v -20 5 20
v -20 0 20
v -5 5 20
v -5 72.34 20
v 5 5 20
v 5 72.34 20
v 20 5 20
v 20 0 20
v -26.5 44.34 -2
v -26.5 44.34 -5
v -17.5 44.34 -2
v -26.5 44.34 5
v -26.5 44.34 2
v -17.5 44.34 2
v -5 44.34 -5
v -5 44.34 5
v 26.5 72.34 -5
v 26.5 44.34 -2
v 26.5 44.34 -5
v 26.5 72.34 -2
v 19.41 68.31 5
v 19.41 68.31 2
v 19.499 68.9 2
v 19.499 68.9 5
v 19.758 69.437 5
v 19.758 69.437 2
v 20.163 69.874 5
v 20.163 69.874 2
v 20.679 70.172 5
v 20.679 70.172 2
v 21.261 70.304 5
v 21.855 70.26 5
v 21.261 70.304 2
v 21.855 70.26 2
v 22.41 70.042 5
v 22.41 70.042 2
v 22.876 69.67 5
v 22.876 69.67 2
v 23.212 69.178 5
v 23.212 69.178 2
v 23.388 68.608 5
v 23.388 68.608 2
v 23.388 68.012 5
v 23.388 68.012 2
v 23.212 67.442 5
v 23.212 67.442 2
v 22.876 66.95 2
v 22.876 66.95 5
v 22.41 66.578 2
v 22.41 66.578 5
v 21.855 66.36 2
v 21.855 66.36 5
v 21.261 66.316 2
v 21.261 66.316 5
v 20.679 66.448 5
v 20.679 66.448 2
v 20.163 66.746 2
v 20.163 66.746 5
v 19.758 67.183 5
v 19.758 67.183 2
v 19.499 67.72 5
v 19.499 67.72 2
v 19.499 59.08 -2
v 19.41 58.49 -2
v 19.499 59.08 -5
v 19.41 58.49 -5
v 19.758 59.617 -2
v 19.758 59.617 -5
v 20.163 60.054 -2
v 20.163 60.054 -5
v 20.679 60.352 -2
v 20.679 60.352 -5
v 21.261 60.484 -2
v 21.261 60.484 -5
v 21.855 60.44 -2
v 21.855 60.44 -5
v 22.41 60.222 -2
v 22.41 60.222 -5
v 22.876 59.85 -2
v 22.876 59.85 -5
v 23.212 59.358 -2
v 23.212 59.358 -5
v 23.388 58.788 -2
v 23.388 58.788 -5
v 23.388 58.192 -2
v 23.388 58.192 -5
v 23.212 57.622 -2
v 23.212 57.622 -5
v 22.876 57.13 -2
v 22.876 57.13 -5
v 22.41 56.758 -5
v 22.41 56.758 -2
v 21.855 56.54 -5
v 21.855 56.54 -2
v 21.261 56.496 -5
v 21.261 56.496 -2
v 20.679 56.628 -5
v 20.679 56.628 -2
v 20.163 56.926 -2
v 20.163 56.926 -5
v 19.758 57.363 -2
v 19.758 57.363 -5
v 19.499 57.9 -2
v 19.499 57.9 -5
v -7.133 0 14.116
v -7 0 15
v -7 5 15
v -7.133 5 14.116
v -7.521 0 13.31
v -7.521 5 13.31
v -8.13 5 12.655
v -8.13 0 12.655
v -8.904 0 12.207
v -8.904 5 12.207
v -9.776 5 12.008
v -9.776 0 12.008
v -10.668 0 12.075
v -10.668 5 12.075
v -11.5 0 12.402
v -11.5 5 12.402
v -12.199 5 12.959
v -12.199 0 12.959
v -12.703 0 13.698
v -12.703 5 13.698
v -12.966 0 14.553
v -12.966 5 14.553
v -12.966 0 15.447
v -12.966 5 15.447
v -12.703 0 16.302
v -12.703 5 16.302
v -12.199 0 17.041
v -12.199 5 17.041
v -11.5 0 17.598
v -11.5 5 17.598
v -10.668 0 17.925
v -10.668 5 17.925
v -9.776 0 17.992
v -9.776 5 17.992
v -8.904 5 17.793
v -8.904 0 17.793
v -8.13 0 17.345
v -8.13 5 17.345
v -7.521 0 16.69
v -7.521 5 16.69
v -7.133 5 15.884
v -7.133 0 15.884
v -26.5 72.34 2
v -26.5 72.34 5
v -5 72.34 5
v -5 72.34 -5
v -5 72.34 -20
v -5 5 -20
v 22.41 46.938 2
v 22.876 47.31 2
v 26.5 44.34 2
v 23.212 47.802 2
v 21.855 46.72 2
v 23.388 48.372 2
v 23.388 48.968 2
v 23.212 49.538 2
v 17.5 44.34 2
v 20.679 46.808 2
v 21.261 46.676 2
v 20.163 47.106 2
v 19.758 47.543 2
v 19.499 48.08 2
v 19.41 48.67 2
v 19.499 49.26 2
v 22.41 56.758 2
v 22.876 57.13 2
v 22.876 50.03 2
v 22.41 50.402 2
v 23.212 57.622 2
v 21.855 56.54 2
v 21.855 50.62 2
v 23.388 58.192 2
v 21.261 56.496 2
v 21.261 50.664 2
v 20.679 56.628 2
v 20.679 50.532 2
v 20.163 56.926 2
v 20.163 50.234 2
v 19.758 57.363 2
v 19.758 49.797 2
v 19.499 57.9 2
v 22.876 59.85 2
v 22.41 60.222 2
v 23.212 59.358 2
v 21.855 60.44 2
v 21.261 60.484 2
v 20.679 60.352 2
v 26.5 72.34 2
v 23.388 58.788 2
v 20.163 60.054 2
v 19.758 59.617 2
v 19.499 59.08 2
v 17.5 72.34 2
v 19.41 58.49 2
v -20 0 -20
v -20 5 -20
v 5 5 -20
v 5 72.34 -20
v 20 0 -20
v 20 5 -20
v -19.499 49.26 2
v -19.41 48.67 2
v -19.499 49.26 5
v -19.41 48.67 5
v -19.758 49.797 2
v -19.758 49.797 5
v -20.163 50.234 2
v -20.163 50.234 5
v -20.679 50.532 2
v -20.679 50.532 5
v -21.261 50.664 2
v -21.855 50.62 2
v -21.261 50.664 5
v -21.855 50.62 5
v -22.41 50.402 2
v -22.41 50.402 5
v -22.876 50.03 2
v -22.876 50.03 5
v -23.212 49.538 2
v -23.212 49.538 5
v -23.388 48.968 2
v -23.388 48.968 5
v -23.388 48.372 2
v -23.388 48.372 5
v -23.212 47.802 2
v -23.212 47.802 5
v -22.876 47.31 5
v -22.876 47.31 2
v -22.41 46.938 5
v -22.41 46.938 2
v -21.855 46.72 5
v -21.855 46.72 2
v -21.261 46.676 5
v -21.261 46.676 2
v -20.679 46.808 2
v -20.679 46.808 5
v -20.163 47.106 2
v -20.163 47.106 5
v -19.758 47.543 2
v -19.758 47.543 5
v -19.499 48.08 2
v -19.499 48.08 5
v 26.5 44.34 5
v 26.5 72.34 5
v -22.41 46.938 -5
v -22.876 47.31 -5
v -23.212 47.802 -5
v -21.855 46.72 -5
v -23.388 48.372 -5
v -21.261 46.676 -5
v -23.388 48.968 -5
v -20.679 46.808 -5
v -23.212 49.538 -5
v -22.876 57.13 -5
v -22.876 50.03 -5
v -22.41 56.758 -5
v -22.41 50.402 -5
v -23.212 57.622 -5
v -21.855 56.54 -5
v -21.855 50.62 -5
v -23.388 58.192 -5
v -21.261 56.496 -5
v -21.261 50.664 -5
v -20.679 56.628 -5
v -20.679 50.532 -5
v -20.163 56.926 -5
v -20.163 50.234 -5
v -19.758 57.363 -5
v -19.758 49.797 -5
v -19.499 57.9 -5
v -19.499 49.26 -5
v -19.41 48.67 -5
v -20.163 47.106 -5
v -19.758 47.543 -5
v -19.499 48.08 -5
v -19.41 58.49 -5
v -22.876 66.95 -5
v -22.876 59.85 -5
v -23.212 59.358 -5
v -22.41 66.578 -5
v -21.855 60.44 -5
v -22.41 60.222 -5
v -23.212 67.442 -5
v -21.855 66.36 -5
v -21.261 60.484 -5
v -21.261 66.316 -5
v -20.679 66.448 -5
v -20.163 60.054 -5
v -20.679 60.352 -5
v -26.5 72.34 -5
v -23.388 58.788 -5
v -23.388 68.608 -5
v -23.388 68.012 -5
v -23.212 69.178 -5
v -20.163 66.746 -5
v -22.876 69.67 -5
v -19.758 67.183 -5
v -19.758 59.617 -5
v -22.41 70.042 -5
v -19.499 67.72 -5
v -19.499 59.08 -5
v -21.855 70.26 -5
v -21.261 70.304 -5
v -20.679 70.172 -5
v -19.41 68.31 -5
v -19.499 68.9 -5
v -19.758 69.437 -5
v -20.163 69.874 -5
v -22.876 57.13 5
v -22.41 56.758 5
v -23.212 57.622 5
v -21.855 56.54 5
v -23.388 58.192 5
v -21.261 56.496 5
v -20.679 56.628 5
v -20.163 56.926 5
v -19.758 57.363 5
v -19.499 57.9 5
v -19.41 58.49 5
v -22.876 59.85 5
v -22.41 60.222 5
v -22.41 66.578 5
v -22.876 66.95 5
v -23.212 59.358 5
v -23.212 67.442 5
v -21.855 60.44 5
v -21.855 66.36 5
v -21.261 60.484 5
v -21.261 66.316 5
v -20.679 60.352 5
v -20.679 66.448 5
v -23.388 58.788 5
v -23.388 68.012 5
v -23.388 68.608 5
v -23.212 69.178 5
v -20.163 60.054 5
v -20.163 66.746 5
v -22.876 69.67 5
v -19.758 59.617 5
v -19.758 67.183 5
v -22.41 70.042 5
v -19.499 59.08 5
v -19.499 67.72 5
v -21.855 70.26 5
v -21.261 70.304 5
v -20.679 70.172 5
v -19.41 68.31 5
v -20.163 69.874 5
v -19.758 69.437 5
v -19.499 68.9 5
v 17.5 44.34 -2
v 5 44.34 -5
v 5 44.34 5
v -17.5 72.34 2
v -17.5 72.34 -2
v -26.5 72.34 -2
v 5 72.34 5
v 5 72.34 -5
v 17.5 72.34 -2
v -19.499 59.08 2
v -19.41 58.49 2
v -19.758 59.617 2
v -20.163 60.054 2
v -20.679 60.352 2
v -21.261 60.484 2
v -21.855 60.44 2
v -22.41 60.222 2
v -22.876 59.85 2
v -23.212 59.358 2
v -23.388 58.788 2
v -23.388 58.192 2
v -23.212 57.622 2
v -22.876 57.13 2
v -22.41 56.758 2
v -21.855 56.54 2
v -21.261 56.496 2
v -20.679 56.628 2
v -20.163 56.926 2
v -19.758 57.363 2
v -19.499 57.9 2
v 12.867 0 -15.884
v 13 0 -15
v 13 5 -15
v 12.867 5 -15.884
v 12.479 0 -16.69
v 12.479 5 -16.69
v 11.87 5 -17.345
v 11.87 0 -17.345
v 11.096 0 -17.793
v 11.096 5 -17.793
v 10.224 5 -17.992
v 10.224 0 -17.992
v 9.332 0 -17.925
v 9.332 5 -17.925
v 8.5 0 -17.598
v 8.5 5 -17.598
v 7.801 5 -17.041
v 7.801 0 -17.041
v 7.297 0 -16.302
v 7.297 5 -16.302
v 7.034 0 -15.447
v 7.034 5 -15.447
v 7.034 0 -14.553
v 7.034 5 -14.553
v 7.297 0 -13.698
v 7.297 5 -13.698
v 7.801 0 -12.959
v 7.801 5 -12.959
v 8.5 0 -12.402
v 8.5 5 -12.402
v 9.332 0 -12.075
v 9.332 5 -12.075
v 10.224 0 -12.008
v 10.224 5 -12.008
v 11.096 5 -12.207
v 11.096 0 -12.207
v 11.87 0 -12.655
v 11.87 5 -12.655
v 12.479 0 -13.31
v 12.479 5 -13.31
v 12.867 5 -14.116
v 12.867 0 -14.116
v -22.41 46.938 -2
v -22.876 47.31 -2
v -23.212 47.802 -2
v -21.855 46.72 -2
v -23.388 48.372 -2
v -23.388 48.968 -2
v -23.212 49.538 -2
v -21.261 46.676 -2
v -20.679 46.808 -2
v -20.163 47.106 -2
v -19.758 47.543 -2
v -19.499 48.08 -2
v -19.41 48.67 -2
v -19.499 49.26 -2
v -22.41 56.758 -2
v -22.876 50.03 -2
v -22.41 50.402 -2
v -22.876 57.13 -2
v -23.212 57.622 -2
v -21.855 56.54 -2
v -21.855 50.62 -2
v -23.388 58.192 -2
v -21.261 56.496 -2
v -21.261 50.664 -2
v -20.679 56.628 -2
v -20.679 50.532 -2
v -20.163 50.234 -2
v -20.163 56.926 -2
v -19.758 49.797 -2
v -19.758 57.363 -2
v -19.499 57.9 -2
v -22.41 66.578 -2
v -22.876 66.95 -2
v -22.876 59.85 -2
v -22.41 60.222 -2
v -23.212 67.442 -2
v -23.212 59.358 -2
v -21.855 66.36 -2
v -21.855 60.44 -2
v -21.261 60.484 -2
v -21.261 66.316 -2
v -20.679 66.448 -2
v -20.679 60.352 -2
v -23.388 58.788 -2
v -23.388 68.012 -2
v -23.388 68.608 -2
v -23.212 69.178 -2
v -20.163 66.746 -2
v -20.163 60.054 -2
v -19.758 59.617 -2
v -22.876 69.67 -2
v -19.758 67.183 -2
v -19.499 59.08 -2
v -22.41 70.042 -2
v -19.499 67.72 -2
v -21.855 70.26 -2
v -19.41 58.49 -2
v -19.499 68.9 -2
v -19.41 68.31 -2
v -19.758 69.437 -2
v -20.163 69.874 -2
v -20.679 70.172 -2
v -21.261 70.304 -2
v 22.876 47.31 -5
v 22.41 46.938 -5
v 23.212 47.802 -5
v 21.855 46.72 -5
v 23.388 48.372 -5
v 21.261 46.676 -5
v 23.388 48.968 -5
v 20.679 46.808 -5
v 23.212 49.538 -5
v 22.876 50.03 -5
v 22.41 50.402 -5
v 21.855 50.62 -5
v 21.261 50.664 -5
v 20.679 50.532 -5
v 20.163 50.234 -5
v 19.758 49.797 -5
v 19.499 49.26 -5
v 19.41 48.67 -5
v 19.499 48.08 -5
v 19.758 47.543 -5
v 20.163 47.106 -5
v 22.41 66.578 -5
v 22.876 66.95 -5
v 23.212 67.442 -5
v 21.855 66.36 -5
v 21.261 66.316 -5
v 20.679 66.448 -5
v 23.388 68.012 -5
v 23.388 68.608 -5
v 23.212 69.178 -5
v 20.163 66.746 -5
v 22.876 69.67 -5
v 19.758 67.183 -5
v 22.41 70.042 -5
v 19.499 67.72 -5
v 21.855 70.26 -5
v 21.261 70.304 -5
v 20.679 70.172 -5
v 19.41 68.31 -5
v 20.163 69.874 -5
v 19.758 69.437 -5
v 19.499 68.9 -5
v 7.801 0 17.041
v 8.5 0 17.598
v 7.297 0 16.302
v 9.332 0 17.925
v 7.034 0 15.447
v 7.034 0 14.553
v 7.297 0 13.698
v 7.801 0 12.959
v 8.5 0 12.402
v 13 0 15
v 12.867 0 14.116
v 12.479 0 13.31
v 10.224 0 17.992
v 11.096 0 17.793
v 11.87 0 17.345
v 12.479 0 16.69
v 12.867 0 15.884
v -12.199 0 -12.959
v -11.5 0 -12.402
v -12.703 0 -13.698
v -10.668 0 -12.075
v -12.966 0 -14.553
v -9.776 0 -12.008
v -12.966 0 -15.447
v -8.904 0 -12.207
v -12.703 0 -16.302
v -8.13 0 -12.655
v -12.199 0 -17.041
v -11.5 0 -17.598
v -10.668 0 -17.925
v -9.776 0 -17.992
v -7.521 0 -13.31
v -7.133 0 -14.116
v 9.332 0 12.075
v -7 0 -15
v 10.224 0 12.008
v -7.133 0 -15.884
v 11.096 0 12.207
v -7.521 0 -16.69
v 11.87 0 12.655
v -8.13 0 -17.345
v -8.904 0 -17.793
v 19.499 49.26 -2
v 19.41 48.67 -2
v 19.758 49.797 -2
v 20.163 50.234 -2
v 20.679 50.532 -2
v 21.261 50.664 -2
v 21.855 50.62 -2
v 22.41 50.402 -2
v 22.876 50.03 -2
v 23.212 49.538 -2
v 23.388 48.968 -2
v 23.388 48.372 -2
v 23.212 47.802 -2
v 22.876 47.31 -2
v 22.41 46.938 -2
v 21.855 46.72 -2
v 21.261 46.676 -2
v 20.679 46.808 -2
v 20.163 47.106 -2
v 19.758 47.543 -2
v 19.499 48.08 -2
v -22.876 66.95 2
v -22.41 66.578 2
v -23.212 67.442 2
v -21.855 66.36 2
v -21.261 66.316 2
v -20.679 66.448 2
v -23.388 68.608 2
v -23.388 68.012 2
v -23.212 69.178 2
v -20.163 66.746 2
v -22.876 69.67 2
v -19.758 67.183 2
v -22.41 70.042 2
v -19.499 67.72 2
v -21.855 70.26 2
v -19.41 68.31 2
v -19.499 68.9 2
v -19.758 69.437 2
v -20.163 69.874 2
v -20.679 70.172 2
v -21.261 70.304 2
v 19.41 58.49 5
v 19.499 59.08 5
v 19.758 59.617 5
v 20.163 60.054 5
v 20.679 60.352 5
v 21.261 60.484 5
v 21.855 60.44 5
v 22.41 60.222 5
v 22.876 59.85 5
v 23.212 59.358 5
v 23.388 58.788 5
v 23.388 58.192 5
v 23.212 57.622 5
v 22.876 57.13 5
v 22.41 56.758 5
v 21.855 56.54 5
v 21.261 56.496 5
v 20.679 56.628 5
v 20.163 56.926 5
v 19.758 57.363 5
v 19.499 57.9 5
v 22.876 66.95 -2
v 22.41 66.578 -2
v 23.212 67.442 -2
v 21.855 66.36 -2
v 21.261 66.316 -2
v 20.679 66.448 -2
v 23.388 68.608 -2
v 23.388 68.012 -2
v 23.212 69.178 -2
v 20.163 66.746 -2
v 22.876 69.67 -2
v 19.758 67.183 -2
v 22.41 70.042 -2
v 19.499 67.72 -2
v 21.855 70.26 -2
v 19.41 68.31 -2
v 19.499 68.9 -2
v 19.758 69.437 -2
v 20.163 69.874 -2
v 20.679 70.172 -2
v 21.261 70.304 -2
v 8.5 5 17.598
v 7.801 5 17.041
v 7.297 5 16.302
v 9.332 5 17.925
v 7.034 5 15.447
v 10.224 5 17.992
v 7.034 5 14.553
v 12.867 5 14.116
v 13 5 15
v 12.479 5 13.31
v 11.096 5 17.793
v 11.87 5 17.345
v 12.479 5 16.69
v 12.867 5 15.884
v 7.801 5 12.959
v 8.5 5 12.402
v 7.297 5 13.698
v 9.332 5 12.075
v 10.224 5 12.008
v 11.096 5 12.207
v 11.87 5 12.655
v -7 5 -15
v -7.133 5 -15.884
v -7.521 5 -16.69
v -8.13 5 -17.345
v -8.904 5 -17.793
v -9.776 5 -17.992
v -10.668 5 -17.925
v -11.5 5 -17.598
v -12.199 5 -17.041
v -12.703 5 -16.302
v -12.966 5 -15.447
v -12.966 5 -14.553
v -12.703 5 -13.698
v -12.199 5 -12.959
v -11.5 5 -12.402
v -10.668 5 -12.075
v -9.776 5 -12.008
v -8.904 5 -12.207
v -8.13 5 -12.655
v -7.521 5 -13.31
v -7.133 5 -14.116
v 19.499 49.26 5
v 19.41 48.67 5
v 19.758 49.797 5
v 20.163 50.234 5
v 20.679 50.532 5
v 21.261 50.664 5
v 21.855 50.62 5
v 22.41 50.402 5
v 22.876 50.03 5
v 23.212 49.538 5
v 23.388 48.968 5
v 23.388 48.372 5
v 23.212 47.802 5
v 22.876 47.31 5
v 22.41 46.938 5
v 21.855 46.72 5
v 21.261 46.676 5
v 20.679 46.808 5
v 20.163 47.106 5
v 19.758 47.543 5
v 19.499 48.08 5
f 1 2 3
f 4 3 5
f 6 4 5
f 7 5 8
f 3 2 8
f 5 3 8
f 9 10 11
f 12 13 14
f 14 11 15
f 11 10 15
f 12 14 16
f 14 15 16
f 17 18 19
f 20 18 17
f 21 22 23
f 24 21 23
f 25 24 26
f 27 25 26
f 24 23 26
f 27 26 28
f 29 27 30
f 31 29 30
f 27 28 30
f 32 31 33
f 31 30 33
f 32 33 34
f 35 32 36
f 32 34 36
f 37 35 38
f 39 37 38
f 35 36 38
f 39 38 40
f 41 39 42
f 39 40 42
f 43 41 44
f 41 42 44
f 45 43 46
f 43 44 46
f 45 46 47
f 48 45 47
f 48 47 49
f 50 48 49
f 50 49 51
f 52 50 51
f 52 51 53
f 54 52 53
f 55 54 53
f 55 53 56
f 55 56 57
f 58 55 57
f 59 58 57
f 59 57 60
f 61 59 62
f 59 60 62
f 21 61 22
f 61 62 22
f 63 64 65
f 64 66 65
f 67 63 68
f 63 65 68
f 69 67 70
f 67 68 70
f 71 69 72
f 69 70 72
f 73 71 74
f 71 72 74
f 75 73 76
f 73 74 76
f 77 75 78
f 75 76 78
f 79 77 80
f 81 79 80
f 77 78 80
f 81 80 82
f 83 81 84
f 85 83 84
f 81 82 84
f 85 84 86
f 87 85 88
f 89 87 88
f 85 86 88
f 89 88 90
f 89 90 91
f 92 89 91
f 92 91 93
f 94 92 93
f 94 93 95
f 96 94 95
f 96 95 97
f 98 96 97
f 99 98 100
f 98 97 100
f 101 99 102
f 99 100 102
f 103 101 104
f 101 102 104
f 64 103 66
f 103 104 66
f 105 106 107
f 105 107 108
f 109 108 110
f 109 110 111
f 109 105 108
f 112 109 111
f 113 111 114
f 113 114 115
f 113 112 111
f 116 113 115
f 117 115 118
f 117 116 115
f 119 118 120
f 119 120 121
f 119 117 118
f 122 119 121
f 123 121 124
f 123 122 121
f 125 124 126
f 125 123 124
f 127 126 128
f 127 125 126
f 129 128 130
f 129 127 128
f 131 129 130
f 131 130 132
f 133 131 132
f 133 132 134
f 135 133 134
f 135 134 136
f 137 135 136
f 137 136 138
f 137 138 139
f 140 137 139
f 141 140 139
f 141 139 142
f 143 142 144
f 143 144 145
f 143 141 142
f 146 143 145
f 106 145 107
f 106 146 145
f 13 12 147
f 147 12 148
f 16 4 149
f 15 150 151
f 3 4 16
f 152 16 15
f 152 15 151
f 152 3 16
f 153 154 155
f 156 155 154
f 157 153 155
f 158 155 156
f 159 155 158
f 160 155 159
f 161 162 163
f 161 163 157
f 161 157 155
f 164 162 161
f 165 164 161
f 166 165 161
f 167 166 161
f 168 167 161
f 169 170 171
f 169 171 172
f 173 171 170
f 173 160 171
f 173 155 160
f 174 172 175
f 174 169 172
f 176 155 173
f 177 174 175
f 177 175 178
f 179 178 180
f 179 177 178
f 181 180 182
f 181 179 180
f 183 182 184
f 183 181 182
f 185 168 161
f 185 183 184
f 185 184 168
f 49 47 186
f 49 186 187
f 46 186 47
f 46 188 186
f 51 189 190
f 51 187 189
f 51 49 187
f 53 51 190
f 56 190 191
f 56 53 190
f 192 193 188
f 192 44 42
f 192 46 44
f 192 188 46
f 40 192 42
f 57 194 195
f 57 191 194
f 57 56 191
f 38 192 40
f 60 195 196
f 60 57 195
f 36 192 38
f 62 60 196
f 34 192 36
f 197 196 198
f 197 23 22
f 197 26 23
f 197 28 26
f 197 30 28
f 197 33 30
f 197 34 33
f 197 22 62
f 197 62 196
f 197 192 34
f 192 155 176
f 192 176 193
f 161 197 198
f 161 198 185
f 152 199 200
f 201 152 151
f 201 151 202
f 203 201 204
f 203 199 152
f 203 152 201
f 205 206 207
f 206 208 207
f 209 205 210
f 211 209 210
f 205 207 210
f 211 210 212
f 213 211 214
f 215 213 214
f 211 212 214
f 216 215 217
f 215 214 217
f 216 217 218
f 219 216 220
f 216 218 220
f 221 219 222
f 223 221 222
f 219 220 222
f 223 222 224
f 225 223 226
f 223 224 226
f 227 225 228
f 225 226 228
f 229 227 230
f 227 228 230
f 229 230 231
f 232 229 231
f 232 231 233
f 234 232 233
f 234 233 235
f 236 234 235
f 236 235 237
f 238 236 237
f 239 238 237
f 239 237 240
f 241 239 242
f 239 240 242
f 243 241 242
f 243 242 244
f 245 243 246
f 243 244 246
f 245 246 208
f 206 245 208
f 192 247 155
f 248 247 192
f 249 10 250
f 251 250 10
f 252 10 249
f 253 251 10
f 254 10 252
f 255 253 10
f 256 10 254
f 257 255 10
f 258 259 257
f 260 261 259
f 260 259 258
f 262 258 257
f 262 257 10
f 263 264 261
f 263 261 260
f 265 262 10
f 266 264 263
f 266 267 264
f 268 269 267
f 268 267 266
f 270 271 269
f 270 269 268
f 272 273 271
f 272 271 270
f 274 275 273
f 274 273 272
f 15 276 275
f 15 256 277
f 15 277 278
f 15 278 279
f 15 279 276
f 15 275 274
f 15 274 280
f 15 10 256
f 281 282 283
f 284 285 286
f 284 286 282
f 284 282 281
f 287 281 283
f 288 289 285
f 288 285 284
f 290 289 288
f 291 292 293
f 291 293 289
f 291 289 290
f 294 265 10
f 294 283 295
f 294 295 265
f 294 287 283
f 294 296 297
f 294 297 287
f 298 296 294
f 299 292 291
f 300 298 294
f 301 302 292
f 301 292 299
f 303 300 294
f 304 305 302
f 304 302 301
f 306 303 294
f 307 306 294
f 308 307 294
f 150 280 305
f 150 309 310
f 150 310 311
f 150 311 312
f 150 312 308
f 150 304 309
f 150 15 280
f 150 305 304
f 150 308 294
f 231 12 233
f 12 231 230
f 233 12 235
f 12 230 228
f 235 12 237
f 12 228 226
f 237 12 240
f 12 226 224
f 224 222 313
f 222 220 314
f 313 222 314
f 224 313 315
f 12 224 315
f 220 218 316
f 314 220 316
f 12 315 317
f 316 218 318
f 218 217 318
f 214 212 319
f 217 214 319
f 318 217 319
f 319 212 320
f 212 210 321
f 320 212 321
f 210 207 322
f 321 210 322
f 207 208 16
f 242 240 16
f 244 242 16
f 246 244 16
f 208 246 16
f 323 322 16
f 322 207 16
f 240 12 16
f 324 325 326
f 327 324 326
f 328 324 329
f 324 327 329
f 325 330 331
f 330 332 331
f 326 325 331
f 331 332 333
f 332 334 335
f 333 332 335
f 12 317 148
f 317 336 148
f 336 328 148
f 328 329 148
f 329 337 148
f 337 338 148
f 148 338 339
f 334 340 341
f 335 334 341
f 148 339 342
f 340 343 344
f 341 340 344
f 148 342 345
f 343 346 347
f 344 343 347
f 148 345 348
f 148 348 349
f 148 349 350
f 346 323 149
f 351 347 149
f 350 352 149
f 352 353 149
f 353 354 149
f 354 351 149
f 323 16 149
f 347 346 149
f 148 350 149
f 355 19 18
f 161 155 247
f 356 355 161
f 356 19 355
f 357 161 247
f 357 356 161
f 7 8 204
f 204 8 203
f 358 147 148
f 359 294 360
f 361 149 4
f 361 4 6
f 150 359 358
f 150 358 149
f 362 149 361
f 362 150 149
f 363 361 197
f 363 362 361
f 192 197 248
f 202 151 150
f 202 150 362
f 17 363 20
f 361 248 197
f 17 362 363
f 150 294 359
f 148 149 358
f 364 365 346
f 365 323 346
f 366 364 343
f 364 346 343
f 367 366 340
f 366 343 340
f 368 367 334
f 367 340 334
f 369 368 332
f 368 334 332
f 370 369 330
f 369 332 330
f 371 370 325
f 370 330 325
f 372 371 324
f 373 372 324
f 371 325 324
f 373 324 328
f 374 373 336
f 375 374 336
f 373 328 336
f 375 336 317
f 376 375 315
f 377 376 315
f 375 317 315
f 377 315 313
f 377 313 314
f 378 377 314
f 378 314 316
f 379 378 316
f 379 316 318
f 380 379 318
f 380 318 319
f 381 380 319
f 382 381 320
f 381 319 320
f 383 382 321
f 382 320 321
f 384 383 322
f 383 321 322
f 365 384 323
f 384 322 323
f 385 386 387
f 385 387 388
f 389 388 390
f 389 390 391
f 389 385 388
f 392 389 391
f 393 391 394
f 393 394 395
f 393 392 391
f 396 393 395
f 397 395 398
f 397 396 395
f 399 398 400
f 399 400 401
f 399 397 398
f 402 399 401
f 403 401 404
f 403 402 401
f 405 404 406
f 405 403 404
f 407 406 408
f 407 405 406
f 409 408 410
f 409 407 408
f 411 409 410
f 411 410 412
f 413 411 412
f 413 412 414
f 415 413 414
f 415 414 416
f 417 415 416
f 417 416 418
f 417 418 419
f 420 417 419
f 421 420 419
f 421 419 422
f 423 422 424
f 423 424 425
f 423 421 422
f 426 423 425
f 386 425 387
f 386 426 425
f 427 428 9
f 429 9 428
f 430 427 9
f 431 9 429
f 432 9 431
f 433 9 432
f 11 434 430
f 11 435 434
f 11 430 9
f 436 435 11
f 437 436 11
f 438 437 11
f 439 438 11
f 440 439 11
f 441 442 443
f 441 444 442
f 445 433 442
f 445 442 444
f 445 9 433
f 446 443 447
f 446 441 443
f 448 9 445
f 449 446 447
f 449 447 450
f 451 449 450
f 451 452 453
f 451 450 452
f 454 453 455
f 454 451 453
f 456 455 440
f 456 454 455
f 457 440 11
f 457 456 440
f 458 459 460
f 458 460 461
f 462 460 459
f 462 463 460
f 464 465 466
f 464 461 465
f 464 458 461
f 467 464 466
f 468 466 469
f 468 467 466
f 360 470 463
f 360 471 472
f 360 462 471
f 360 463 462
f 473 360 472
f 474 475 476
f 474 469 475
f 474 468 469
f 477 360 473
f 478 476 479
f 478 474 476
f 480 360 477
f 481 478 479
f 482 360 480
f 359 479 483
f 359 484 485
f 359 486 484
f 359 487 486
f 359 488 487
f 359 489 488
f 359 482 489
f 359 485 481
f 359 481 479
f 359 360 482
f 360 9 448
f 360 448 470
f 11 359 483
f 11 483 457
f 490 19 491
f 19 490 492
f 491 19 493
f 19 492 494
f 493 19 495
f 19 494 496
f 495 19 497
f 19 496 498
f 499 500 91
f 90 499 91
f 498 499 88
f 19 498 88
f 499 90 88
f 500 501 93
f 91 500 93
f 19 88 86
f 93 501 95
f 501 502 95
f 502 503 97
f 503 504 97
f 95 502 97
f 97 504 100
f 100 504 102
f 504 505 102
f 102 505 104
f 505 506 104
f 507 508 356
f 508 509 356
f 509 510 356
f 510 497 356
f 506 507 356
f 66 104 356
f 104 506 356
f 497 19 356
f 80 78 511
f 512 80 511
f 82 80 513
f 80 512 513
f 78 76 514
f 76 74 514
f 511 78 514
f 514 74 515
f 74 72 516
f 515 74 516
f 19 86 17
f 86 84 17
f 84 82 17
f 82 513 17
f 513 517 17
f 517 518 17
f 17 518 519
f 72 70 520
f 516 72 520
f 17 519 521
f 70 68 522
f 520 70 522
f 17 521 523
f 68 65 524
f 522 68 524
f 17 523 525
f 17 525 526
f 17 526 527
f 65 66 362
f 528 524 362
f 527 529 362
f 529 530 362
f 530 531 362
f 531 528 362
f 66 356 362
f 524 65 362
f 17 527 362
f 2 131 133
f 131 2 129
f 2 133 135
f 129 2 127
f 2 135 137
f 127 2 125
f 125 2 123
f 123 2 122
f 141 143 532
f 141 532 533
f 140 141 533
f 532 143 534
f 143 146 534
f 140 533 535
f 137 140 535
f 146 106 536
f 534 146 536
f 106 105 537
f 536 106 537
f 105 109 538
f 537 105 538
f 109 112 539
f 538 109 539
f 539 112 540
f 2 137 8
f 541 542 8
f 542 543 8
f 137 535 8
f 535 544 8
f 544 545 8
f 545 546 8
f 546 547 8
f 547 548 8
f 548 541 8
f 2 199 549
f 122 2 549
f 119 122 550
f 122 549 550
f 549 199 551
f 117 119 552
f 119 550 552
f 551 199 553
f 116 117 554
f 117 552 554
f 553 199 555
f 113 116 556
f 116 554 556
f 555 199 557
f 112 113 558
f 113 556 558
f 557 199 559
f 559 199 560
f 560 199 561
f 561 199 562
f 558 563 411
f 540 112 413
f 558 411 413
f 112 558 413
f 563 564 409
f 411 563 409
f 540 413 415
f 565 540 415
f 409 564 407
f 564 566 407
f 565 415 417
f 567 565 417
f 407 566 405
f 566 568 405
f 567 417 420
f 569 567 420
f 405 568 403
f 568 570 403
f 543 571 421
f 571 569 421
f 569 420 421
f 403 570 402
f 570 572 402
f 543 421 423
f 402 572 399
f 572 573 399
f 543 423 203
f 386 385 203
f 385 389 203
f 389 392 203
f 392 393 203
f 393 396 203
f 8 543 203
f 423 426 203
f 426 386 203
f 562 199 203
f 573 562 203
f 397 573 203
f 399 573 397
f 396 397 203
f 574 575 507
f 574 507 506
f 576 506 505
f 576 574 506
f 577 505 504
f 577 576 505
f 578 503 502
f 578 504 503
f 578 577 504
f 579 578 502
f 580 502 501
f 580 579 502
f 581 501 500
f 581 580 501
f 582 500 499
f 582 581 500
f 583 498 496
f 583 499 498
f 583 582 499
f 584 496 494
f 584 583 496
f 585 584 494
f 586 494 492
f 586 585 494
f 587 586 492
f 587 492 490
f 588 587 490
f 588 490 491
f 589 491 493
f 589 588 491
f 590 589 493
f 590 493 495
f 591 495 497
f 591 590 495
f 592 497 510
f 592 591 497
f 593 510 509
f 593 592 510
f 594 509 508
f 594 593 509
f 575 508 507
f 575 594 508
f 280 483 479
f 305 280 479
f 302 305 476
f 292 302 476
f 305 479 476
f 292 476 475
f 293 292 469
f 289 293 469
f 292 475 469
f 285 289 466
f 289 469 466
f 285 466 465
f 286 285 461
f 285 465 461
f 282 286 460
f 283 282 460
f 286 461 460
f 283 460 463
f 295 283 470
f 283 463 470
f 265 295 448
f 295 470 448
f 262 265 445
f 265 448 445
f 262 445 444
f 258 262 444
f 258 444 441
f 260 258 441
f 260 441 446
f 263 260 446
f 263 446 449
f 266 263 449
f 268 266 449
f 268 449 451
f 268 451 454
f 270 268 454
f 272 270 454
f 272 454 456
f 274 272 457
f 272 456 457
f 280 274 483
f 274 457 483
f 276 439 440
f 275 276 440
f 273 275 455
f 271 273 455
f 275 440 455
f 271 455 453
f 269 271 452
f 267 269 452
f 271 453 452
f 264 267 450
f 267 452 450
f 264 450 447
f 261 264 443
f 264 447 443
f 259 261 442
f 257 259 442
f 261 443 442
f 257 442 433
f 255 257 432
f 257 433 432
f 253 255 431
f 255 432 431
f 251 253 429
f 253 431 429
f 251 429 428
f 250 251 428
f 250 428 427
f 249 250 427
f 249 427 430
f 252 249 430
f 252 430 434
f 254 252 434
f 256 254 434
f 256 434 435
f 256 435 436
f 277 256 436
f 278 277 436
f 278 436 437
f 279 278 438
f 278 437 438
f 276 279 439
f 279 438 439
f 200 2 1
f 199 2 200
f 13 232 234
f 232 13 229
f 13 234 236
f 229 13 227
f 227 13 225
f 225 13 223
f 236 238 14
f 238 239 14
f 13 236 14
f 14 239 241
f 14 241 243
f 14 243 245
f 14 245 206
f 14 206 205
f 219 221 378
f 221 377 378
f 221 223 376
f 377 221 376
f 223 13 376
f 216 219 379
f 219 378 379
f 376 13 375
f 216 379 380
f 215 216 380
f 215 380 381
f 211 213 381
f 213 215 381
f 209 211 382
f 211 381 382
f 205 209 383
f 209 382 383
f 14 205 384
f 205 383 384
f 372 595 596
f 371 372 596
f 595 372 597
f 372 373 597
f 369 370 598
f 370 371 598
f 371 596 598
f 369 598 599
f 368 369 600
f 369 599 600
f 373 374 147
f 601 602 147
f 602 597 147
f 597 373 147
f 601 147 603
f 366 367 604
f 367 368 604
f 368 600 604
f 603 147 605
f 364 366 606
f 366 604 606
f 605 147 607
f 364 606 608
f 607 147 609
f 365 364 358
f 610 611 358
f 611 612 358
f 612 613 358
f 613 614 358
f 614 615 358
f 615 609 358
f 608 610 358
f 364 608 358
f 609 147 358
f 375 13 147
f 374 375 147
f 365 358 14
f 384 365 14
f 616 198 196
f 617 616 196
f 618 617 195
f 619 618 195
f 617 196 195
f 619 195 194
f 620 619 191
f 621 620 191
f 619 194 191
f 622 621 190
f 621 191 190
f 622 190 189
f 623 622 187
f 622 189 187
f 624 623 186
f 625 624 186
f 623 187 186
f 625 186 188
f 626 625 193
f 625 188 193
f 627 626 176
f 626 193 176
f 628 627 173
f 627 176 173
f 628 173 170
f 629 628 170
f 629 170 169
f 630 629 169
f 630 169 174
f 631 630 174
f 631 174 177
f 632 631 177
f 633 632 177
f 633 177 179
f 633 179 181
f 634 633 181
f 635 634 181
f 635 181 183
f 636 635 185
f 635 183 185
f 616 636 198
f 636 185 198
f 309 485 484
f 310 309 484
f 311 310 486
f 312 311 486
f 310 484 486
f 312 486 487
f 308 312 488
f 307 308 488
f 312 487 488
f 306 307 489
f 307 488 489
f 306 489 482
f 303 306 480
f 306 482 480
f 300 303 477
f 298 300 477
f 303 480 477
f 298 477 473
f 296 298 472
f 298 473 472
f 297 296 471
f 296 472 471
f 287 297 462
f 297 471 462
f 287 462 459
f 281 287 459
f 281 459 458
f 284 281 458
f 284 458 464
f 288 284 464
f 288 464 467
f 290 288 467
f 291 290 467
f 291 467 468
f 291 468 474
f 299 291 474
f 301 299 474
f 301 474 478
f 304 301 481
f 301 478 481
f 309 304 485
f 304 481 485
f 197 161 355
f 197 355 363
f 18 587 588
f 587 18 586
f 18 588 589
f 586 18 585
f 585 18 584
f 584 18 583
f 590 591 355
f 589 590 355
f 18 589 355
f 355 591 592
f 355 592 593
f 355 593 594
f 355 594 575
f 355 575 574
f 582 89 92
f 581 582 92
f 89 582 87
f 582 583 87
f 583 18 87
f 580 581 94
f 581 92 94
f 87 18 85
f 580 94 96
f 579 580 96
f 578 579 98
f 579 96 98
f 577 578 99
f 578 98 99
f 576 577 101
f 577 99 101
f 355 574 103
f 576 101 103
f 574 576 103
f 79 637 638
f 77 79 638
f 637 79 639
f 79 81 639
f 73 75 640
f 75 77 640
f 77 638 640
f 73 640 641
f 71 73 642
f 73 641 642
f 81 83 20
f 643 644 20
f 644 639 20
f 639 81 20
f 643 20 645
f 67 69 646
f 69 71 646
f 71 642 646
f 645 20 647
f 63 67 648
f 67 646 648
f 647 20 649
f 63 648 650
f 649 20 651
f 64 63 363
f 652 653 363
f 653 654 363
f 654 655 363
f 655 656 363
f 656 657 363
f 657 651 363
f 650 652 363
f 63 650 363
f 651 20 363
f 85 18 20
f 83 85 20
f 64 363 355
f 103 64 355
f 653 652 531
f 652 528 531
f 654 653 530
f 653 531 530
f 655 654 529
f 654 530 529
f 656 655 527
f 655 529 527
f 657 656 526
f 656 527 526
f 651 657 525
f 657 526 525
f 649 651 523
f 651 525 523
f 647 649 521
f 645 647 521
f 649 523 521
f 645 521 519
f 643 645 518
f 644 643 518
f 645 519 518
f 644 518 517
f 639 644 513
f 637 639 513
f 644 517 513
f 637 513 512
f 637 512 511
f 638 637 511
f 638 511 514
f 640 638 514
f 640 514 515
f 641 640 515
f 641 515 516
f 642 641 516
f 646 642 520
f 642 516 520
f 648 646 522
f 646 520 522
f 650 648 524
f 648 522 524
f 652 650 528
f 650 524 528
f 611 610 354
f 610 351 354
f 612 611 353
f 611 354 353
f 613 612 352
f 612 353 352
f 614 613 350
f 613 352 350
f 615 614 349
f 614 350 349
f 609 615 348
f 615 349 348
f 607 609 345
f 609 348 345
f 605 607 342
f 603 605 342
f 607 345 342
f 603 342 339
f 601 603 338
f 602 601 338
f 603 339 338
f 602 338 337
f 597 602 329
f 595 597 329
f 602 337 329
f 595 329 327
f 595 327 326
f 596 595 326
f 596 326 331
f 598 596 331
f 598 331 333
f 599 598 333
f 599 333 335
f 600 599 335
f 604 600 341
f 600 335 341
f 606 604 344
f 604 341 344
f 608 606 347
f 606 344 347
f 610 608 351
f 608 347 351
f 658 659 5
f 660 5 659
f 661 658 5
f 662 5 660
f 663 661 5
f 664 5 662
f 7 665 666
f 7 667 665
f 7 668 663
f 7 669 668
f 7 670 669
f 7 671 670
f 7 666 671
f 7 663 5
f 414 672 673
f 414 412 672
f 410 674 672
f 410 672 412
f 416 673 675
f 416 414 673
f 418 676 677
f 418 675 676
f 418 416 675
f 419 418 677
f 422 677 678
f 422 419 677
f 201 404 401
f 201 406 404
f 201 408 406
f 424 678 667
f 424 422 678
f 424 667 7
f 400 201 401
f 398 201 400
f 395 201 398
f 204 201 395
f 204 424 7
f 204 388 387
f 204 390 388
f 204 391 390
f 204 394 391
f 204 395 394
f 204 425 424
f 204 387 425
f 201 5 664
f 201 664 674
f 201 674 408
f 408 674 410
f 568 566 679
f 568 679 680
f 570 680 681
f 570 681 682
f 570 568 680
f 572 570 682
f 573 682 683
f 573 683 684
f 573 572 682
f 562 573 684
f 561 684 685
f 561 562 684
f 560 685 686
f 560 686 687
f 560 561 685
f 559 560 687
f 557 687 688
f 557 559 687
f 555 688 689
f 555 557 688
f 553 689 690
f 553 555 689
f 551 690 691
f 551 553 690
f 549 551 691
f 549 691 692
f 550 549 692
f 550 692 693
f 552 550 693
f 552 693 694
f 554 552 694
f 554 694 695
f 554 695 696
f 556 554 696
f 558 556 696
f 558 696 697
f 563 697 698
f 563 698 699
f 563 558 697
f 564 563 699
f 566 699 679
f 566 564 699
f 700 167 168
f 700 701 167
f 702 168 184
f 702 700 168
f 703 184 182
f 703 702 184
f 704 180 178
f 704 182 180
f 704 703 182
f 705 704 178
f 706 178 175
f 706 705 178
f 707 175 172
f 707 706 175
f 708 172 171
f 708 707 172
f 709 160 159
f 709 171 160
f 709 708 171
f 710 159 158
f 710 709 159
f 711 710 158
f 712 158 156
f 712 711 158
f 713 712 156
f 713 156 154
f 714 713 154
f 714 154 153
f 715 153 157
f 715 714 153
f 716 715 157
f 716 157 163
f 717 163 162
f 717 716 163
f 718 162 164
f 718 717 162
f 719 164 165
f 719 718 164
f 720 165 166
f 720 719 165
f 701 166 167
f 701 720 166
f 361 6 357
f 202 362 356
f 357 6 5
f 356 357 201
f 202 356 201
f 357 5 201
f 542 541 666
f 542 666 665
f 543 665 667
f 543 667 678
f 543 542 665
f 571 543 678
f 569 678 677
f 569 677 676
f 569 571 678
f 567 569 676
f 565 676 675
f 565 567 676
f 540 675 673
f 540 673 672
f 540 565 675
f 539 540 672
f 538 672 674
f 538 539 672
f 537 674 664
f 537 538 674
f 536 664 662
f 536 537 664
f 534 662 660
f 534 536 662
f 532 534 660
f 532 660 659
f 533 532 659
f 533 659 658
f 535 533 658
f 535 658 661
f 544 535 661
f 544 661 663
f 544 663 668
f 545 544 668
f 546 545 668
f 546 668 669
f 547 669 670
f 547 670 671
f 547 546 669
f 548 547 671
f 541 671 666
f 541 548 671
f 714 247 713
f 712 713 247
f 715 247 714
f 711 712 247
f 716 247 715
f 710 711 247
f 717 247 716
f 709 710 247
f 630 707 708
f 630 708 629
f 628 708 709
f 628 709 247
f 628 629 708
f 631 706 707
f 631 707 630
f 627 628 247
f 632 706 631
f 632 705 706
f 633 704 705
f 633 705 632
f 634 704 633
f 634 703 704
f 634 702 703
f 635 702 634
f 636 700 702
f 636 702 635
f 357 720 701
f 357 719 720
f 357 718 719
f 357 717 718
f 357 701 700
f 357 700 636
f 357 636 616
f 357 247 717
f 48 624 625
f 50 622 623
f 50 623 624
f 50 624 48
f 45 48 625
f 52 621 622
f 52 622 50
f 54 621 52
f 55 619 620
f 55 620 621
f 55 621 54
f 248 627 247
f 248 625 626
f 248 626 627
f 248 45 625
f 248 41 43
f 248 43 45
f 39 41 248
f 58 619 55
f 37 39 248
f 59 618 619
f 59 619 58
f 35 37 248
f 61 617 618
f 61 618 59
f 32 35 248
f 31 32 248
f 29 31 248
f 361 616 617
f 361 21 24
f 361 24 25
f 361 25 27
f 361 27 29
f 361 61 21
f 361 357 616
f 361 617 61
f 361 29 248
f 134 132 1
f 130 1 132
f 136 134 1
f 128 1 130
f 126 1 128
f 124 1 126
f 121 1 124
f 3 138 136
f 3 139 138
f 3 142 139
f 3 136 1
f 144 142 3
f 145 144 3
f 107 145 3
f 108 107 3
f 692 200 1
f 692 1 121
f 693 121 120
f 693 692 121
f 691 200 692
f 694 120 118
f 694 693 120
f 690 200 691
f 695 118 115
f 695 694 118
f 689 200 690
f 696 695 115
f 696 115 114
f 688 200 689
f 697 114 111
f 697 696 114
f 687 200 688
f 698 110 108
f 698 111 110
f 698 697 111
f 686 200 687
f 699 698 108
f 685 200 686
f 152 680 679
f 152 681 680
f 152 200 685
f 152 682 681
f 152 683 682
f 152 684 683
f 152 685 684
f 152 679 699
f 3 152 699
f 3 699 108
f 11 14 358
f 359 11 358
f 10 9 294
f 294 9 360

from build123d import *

# Parameters (mm, degrees)
SKETCH_1_W          = 40
SKETCH_1_H          = 40
SKETCH_1_R          = 3
EXTRUDE_1_DEPTH     = 5
SKETCH_2_W          = 10
SKETCH_2_H          = 40
EXTRUDE_2_DEPTH     = 67.34
SKETCH_3_W          = 10
SKETCH_3_H          = 28
EXTRUDE_3_DEPTH     = 24.5
SKETCH_5_R          = 2
CUT_EXTRUDE_1_DEPTH = 12.25
SKETCH_6_W          = 12
SKETCH_6_H          = 28
CUT_EXTRUDE_2_DEPTH = 2
SKETCH_7_W          = 3
SKETCH_7_H          = 28
CUT_EXTRUDE_3_DEPTH = 25


with BuildPart() as part:
    # 草图1 → 凸台-拉伸1 (new body)
    with BuildSketch(Plane(origin=(0, 0, 0), x_dir=(1, 0, 0), z_dir=(0, 1, 0))):
        Rectangle(SKETCH_1_W, SKETCH_1_H)
        with Locations((-10, -15)):
            Circle(SKETCH_1_R, mode=Mode.SUBTRACT)
        with Locations((10, -15)):
            Circle(SKETCH_1_R, mode=Mode.SUBTRACT)
        with Locations((10, 15)):
            Circle(SKETCH_1_R, mode=Mode.SUBTRACT)
        with Locations((-10, 15)):
            Circle(SKETCH_1_R, mode=Mode.SUBTRACT)
    extrude(amount=EXTRUDE_1_DEPTH)

    # 草图2 → 凸台-拉伸2 (add)
    with BuildSketch(Plane(origin=(0, 5, 0), x_dir=(1, 0, 0), z_dir=(0, 1, 0))):
        Rectangle(SKETCH_2_W, SKETCH_2_H)
    extrude(amount=EXTRUDE_2_DEPTH)

    # 草图3 → 凸台-拉伸3 (add)
    with BuildSketch(Plane.ZY.offset(5)):
        with Locations((0, 58.34)):
            Rectangle(SKETCH_3_W, SKETCH_3_H)
    extrude_3 = extrude(amount=EXTRUDE_3_DEPTH)

    # 草图5 → 切除-拉伸1 (cut, symmetric)
    with BuildSketch(Plane.XY):
        with Locations((-21.41, 68.31)):
            Circle(SKETCH_5_R)
        with Locations((-21.41, 58.49)):
            Circle(SKETCH_5_R)
        with Locations((-21.41, 48.67)):
            Circle(SKETCH_5_R)
    cut_extrude_1 = extrude(amount=CUT_EXTRUDE_1_DEPTH, both=True, mode=Mode.SUBTRACT)

    # 草图6 → 切除-拉伸2 (cut, symmetric)
    with BuildSketch(Plane.XY):
        with Locations((-23.5, 58.34)):
            Rectangle(SKETCH_6_W, SKETCH_6_H)
    cut_extrude_2 = extrude(amount=CUT_EXTRUDE_2_DEPTH, both=True, mode=Mode.SUBTRACT)

    # 镜向1: 凸台-拉伸3, 切除-拉伸1, 切除-拉伸2 across plane
    add(extrude_3.mirror(Plane(origin=(0, 0, 0), x_dir=(0, 0, 1), z_dir=(1, 0, 0))))
    add(cut_extrude_1.mirror(Plane(origin=(0, 0, 0), x_dir=(0, 0, 1), z_dir=(1, 0, 0))), mode=Mode.SUBTRACT)
    add(cut_extrude_2.mirror(Plane(origin=(0, 0, 0), x_dir=(0, 0, 1), z_dir=(1, 0, 0))), mode=Mode.SUBTRACT)

    # 草图7 → 切除-拉伸3 (cut, symmetric)
    with BuildSketch(Plane.XY):
        with Locations((-28, 58.34)):
            Rectangle(SKETCH_7_W, SKETCH_7_H)
    cut_extrude_3 = extrude(amount=CUT_EXTRUDE_3_DEPTH, both=True, mode=Mode.SUBTRACT)

    # 镜向2: 切除-拉伸3 across plane
    add(cut_extrude_3.mirror(Plane(origin=(0, 0, 0), x_dir=(0, 0, 1), z_dir=(1, 0, 0))), mode=Mode.SUBTRACT)


solid = part.part
